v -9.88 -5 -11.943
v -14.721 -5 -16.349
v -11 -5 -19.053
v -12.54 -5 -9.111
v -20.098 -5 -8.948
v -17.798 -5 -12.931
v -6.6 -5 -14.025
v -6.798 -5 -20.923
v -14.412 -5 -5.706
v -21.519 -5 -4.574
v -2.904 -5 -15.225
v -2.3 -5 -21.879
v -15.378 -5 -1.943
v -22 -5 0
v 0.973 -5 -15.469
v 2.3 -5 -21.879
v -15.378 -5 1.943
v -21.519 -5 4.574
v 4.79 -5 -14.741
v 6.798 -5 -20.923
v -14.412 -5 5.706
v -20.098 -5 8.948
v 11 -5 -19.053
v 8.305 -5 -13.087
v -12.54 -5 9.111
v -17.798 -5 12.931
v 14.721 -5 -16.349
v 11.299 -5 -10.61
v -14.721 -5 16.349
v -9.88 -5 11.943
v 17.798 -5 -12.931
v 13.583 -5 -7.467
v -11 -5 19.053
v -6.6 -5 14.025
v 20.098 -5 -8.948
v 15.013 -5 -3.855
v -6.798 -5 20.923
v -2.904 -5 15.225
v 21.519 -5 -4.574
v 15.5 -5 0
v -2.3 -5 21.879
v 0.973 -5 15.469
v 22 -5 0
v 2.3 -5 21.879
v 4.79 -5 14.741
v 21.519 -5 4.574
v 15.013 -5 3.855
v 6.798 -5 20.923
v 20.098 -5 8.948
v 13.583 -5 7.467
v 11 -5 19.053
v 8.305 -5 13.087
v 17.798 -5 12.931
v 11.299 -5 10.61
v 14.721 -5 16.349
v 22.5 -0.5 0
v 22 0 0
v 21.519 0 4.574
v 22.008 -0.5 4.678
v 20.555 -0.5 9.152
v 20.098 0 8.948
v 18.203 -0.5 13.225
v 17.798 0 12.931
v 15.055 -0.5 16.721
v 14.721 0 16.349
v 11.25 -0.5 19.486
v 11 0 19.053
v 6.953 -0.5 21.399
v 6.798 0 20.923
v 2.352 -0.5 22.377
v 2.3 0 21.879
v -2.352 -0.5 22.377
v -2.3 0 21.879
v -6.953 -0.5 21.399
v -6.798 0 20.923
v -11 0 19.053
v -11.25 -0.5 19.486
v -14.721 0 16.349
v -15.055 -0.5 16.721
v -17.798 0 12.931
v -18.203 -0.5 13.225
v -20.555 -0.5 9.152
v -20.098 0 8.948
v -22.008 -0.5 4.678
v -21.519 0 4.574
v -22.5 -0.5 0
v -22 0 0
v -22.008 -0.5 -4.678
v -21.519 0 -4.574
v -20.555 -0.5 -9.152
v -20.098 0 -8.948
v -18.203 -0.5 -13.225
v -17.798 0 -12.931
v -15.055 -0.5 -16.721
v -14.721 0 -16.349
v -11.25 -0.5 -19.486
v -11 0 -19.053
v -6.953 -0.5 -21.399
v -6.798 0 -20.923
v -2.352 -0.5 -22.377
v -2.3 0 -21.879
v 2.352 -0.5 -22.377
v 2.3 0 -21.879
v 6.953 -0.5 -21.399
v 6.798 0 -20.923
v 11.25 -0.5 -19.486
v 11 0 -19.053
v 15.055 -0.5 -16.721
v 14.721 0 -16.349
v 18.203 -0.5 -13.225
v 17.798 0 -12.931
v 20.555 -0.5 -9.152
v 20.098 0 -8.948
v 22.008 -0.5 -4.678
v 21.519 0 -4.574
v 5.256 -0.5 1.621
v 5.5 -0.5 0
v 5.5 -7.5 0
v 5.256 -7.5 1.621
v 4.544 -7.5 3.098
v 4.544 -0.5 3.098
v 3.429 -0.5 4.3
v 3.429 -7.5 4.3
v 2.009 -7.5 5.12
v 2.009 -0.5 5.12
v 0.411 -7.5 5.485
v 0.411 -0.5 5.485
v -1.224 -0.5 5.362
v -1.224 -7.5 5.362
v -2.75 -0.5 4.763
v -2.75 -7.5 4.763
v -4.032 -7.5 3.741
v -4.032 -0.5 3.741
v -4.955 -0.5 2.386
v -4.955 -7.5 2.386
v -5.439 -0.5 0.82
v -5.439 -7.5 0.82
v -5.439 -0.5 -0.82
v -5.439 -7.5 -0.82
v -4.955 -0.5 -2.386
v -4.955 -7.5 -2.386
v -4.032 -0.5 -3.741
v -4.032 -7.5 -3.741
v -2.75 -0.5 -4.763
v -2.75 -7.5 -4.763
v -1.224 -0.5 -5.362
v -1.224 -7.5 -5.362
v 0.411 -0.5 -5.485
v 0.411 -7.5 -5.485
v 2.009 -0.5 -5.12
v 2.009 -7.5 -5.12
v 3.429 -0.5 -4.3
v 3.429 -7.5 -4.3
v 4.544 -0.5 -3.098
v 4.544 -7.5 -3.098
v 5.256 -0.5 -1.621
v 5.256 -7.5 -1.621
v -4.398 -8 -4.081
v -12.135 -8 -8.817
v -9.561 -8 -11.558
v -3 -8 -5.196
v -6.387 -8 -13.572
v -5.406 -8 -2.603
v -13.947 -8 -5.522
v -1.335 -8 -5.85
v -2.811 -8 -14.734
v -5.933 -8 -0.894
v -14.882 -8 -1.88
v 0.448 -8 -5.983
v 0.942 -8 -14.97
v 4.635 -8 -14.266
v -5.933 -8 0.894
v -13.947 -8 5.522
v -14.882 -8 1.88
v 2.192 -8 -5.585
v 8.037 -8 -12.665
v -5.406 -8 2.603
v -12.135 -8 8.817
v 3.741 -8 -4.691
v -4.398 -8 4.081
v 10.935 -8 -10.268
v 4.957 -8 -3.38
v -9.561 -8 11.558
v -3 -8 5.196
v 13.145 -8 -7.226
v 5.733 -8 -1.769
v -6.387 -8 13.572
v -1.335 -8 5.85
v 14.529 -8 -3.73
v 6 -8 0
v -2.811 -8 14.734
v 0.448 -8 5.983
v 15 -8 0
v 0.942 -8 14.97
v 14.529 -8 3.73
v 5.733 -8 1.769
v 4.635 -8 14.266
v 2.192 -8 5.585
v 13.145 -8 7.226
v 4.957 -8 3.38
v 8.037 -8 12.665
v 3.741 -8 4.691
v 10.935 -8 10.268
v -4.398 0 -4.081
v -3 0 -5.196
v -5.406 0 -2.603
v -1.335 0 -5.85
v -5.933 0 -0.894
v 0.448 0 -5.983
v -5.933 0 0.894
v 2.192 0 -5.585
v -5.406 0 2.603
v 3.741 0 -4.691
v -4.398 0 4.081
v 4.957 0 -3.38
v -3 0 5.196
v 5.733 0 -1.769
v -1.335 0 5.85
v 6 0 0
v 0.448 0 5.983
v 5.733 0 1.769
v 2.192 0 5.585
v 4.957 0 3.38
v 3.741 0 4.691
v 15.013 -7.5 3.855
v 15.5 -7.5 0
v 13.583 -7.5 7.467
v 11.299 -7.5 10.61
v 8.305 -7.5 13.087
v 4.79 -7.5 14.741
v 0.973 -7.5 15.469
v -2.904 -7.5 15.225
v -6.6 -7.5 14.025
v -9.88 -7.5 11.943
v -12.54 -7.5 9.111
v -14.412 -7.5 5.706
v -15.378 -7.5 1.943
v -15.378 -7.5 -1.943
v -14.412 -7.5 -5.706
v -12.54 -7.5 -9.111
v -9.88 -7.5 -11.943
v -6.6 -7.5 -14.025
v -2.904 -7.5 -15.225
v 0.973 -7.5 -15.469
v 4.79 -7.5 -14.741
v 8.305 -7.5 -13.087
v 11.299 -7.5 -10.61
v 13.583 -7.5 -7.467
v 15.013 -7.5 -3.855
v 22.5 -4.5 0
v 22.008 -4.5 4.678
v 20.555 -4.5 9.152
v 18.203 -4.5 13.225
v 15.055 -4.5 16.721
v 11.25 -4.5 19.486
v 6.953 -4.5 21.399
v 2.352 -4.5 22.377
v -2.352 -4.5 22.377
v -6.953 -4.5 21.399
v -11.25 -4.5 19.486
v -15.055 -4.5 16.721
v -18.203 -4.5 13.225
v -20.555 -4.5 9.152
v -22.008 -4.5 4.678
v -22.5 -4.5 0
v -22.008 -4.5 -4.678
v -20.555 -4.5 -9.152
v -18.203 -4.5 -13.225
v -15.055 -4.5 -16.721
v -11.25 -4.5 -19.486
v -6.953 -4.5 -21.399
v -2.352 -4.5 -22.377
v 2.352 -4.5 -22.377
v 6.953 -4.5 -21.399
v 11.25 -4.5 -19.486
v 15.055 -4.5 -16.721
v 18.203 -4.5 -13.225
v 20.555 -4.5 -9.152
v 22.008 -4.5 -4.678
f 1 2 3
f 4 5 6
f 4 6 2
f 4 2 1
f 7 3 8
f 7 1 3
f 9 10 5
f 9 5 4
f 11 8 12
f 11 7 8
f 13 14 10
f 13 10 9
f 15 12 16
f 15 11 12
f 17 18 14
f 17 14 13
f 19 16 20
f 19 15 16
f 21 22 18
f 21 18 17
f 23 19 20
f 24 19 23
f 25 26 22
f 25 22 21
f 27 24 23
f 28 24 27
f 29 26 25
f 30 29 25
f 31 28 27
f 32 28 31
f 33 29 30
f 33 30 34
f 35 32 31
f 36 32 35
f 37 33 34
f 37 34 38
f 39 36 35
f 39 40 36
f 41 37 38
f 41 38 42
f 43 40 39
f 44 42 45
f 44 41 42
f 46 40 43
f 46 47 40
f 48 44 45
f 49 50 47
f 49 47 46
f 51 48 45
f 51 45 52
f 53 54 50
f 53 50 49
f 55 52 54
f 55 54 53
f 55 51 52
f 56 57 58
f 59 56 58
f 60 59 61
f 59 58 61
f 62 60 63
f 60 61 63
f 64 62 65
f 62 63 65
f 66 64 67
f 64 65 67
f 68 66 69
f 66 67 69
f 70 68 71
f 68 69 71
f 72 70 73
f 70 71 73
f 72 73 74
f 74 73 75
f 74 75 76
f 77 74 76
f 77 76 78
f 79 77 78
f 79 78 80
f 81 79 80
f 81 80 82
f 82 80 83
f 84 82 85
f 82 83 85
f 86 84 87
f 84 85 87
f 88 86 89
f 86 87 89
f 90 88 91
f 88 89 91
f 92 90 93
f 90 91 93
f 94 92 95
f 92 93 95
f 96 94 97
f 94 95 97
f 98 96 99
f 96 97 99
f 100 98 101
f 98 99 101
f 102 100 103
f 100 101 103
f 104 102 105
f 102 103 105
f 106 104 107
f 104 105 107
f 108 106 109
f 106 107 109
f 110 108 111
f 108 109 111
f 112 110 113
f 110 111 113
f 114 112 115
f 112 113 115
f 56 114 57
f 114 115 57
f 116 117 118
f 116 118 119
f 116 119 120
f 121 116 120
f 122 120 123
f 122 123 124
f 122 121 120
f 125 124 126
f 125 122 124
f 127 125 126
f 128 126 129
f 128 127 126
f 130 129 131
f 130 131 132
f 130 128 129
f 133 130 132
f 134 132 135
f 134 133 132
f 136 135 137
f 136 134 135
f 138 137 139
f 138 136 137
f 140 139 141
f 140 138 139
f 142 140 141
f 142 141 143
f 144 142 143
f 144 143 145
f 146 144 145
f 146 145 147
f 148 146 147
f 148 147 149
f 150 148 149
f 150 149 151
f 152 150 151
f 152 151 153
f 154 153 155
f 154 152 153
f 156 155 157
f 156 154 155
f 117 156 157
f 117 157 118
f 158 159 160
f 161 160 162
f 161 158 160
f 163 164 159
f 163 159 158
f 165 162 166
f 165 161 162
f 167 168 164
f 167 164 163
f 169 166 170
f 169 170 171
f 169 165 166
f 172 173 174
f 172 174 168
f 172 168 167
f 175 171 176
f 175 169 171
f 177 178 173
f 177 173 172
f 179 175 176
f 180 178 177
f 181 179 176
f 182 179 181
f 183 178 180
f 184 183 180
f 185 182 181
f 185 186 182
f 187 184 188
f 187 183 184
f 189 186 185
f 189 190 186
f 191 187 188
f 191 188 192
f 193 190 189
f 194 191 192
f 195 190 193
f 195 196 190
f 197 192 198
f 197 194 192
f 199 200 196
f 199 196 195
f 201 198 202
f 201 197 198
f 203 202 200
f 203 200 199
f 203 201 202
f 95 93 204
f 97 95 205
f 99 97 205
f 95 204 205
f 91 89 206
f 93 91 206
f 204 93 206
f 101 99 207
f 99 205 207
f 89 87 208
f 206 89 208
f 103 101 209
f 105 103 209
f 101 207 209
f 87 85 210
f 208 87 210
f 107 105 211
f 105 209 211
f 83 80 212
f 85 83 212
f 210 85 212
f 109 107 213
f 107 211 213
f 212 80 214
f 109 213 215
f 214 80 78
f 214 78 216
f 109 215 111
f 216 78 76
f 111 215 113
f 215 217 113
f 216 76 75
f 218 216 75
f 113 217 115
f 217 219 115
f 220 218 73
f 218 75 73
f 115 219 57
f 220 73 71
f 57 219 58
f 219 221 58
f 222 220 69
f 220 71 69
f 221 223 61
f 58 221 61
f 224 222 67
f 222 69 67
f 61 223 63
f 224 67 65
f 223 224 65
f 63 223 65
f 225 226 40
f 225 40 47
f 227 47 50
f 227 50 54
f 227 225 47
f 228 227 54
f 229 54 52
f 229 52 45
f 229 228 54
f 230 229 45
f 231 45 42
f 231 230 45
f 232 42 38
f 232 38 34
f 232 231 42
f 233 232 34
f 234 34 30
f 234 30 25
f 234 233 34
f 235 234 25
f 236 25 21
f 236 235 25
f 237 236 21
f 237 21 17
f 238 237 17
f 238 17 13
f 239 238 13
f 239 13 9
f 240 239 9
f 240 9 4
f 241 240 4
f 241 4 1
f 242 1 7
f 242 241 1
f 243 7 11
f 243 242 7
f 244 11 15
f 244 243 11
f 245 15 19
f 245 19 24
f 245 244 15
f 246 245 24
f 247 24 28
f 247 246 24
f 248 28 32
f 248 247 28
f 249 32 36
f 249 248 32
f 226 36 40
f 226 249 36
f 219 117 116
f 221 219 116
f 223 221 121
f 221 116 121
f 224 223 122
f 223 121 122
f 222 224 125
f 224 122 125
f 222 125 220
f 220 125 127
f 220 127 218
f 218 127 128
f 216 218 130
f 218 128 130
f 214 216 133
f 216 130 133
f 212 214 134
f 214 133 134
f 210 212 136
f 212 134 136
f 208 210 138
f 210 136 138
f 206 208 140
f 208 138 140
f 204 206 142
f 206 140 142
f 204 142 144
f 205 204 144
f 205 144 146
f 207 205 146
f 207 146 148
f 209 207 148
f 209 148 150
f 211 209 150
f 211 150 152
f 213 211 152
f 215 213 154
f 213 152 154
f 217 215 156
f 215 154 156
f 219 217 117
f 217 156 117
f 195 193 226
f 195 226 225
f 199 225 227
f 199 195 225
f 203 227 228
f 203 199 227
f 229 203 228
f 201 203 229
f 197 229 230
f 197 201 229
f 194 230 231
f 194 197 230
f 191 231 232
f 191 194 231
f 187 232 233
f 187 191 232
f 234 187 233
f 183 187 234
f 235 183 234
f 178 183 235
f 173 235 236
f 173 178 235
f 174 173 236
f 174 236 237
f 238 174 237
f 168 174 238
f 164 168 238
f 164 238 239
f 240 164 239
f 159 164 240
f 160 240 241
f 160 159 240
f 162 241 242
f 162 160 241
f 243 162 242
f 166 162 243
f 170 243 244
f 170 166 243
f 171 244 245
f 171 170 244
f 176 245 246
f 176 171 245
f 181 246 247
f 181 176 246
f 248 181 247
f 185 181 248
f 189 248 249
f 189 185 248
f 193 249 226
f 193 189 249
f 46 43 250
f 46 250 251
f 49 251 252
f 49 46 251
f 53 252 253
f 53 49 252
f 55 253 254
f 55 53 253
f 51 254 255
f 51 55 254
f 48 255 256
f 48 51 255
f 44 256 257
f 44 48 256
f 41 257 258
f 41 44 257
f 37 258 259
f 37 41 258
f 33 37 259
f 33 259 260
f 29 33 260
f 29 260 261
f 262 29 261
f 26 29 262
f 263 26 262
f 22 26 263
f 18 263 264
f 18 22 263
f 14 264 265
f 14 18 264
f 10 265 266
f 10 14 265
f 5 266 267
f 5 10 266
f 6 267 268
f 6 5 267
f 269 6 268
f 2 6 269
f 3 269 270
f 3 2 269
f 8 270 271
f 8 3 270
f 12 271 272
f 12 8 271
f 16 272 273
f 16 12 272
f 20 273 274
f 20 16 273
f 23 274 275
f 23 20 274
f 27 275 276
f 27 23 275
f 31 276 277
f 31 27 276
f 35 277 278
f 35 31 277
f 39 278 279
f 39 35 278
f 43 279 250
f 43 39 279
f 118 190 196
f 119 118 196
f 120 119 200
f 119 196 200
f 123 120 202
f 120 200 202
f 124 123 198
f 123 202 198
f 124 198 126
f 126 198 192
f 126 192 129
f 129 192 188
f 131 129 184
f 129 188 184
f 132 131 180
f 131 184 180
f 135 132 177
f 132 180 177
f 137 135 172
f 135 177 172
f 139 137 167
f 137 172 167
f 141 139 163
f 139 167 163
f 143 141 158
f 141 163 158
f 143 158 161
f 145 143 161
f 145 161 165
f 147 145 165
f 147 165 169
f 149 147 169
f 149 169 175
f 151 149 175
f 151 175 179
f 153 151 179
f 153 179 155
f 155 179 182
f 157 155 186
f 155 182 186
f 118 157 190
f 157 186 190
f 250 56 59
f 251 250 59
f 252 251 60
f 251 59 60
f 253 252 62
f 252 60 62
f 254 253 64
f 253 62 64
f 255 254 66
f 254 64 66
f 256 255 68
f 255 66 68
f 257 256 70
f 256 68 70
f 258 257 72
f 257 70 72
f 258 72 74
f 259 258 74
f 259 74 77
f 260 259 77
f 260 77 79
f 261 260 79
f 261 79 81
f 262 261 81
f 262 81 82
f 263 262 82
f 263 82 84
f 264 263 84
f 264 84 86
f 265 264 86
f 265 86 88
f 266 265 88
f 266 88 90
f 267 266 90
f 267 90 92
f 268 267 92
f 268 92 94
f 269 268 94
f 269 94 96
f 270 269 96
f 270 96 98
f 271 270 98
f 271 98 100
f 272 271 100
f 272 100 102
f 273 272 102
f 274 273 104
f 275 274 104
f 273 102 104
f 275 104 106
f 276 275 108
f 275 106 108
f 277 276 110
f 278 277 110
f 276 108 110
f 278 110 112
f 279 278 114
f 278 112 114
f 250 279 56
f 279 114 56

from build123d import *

# Parameters (mm, degrees)
F0_R     = 22.5
F0_R_2   = 5.5
F1_DEPTH = 8
F2_R     = 22.5
F2_R_2   = 15.5
F3_DEPTH = 3
F4_SIZE  = 0.5
F5_SIZE  = 0.5


with BuildPart() as f1:
    # F0 (on Front) → F1 (new body)
    with BuildSketch(Plane.XZ):
        Circle(F0_R)
        Circle(F0_R_2, mode=Mode.SUBTRACT)
    extrude(amount=F1_DEPTH)

    # F2 (on face) → F3 (cut)
    with BuildSketch(Plane.XZ.offset(8)):
        Circle(F2_R)
        Circle(F2_R_2, mode=Mode.SUBTRACT)
    extrude(amount=-F3_DEPTH, mode=Mode.SUBTRACT)

    # F4
    f4_edges = [f1.edges().sort_by_distance(p)[0] for p in [
        (-22.5, 0, 0),
        (-22.5, -5, 0),
        (-15.5, -8, 0),
    ]]
    chamfer(f4_edges, length=F4_SIZE)

    # F5
    f5_edges = [f1.edges().sort_by_distance(p)[0] for p in [
        (-5.5, -8, 0),
        (-5.5, 0, 0),
    ]]
    chamfer(f5_edges, length=F5_SIZE)


solid = f1.part
